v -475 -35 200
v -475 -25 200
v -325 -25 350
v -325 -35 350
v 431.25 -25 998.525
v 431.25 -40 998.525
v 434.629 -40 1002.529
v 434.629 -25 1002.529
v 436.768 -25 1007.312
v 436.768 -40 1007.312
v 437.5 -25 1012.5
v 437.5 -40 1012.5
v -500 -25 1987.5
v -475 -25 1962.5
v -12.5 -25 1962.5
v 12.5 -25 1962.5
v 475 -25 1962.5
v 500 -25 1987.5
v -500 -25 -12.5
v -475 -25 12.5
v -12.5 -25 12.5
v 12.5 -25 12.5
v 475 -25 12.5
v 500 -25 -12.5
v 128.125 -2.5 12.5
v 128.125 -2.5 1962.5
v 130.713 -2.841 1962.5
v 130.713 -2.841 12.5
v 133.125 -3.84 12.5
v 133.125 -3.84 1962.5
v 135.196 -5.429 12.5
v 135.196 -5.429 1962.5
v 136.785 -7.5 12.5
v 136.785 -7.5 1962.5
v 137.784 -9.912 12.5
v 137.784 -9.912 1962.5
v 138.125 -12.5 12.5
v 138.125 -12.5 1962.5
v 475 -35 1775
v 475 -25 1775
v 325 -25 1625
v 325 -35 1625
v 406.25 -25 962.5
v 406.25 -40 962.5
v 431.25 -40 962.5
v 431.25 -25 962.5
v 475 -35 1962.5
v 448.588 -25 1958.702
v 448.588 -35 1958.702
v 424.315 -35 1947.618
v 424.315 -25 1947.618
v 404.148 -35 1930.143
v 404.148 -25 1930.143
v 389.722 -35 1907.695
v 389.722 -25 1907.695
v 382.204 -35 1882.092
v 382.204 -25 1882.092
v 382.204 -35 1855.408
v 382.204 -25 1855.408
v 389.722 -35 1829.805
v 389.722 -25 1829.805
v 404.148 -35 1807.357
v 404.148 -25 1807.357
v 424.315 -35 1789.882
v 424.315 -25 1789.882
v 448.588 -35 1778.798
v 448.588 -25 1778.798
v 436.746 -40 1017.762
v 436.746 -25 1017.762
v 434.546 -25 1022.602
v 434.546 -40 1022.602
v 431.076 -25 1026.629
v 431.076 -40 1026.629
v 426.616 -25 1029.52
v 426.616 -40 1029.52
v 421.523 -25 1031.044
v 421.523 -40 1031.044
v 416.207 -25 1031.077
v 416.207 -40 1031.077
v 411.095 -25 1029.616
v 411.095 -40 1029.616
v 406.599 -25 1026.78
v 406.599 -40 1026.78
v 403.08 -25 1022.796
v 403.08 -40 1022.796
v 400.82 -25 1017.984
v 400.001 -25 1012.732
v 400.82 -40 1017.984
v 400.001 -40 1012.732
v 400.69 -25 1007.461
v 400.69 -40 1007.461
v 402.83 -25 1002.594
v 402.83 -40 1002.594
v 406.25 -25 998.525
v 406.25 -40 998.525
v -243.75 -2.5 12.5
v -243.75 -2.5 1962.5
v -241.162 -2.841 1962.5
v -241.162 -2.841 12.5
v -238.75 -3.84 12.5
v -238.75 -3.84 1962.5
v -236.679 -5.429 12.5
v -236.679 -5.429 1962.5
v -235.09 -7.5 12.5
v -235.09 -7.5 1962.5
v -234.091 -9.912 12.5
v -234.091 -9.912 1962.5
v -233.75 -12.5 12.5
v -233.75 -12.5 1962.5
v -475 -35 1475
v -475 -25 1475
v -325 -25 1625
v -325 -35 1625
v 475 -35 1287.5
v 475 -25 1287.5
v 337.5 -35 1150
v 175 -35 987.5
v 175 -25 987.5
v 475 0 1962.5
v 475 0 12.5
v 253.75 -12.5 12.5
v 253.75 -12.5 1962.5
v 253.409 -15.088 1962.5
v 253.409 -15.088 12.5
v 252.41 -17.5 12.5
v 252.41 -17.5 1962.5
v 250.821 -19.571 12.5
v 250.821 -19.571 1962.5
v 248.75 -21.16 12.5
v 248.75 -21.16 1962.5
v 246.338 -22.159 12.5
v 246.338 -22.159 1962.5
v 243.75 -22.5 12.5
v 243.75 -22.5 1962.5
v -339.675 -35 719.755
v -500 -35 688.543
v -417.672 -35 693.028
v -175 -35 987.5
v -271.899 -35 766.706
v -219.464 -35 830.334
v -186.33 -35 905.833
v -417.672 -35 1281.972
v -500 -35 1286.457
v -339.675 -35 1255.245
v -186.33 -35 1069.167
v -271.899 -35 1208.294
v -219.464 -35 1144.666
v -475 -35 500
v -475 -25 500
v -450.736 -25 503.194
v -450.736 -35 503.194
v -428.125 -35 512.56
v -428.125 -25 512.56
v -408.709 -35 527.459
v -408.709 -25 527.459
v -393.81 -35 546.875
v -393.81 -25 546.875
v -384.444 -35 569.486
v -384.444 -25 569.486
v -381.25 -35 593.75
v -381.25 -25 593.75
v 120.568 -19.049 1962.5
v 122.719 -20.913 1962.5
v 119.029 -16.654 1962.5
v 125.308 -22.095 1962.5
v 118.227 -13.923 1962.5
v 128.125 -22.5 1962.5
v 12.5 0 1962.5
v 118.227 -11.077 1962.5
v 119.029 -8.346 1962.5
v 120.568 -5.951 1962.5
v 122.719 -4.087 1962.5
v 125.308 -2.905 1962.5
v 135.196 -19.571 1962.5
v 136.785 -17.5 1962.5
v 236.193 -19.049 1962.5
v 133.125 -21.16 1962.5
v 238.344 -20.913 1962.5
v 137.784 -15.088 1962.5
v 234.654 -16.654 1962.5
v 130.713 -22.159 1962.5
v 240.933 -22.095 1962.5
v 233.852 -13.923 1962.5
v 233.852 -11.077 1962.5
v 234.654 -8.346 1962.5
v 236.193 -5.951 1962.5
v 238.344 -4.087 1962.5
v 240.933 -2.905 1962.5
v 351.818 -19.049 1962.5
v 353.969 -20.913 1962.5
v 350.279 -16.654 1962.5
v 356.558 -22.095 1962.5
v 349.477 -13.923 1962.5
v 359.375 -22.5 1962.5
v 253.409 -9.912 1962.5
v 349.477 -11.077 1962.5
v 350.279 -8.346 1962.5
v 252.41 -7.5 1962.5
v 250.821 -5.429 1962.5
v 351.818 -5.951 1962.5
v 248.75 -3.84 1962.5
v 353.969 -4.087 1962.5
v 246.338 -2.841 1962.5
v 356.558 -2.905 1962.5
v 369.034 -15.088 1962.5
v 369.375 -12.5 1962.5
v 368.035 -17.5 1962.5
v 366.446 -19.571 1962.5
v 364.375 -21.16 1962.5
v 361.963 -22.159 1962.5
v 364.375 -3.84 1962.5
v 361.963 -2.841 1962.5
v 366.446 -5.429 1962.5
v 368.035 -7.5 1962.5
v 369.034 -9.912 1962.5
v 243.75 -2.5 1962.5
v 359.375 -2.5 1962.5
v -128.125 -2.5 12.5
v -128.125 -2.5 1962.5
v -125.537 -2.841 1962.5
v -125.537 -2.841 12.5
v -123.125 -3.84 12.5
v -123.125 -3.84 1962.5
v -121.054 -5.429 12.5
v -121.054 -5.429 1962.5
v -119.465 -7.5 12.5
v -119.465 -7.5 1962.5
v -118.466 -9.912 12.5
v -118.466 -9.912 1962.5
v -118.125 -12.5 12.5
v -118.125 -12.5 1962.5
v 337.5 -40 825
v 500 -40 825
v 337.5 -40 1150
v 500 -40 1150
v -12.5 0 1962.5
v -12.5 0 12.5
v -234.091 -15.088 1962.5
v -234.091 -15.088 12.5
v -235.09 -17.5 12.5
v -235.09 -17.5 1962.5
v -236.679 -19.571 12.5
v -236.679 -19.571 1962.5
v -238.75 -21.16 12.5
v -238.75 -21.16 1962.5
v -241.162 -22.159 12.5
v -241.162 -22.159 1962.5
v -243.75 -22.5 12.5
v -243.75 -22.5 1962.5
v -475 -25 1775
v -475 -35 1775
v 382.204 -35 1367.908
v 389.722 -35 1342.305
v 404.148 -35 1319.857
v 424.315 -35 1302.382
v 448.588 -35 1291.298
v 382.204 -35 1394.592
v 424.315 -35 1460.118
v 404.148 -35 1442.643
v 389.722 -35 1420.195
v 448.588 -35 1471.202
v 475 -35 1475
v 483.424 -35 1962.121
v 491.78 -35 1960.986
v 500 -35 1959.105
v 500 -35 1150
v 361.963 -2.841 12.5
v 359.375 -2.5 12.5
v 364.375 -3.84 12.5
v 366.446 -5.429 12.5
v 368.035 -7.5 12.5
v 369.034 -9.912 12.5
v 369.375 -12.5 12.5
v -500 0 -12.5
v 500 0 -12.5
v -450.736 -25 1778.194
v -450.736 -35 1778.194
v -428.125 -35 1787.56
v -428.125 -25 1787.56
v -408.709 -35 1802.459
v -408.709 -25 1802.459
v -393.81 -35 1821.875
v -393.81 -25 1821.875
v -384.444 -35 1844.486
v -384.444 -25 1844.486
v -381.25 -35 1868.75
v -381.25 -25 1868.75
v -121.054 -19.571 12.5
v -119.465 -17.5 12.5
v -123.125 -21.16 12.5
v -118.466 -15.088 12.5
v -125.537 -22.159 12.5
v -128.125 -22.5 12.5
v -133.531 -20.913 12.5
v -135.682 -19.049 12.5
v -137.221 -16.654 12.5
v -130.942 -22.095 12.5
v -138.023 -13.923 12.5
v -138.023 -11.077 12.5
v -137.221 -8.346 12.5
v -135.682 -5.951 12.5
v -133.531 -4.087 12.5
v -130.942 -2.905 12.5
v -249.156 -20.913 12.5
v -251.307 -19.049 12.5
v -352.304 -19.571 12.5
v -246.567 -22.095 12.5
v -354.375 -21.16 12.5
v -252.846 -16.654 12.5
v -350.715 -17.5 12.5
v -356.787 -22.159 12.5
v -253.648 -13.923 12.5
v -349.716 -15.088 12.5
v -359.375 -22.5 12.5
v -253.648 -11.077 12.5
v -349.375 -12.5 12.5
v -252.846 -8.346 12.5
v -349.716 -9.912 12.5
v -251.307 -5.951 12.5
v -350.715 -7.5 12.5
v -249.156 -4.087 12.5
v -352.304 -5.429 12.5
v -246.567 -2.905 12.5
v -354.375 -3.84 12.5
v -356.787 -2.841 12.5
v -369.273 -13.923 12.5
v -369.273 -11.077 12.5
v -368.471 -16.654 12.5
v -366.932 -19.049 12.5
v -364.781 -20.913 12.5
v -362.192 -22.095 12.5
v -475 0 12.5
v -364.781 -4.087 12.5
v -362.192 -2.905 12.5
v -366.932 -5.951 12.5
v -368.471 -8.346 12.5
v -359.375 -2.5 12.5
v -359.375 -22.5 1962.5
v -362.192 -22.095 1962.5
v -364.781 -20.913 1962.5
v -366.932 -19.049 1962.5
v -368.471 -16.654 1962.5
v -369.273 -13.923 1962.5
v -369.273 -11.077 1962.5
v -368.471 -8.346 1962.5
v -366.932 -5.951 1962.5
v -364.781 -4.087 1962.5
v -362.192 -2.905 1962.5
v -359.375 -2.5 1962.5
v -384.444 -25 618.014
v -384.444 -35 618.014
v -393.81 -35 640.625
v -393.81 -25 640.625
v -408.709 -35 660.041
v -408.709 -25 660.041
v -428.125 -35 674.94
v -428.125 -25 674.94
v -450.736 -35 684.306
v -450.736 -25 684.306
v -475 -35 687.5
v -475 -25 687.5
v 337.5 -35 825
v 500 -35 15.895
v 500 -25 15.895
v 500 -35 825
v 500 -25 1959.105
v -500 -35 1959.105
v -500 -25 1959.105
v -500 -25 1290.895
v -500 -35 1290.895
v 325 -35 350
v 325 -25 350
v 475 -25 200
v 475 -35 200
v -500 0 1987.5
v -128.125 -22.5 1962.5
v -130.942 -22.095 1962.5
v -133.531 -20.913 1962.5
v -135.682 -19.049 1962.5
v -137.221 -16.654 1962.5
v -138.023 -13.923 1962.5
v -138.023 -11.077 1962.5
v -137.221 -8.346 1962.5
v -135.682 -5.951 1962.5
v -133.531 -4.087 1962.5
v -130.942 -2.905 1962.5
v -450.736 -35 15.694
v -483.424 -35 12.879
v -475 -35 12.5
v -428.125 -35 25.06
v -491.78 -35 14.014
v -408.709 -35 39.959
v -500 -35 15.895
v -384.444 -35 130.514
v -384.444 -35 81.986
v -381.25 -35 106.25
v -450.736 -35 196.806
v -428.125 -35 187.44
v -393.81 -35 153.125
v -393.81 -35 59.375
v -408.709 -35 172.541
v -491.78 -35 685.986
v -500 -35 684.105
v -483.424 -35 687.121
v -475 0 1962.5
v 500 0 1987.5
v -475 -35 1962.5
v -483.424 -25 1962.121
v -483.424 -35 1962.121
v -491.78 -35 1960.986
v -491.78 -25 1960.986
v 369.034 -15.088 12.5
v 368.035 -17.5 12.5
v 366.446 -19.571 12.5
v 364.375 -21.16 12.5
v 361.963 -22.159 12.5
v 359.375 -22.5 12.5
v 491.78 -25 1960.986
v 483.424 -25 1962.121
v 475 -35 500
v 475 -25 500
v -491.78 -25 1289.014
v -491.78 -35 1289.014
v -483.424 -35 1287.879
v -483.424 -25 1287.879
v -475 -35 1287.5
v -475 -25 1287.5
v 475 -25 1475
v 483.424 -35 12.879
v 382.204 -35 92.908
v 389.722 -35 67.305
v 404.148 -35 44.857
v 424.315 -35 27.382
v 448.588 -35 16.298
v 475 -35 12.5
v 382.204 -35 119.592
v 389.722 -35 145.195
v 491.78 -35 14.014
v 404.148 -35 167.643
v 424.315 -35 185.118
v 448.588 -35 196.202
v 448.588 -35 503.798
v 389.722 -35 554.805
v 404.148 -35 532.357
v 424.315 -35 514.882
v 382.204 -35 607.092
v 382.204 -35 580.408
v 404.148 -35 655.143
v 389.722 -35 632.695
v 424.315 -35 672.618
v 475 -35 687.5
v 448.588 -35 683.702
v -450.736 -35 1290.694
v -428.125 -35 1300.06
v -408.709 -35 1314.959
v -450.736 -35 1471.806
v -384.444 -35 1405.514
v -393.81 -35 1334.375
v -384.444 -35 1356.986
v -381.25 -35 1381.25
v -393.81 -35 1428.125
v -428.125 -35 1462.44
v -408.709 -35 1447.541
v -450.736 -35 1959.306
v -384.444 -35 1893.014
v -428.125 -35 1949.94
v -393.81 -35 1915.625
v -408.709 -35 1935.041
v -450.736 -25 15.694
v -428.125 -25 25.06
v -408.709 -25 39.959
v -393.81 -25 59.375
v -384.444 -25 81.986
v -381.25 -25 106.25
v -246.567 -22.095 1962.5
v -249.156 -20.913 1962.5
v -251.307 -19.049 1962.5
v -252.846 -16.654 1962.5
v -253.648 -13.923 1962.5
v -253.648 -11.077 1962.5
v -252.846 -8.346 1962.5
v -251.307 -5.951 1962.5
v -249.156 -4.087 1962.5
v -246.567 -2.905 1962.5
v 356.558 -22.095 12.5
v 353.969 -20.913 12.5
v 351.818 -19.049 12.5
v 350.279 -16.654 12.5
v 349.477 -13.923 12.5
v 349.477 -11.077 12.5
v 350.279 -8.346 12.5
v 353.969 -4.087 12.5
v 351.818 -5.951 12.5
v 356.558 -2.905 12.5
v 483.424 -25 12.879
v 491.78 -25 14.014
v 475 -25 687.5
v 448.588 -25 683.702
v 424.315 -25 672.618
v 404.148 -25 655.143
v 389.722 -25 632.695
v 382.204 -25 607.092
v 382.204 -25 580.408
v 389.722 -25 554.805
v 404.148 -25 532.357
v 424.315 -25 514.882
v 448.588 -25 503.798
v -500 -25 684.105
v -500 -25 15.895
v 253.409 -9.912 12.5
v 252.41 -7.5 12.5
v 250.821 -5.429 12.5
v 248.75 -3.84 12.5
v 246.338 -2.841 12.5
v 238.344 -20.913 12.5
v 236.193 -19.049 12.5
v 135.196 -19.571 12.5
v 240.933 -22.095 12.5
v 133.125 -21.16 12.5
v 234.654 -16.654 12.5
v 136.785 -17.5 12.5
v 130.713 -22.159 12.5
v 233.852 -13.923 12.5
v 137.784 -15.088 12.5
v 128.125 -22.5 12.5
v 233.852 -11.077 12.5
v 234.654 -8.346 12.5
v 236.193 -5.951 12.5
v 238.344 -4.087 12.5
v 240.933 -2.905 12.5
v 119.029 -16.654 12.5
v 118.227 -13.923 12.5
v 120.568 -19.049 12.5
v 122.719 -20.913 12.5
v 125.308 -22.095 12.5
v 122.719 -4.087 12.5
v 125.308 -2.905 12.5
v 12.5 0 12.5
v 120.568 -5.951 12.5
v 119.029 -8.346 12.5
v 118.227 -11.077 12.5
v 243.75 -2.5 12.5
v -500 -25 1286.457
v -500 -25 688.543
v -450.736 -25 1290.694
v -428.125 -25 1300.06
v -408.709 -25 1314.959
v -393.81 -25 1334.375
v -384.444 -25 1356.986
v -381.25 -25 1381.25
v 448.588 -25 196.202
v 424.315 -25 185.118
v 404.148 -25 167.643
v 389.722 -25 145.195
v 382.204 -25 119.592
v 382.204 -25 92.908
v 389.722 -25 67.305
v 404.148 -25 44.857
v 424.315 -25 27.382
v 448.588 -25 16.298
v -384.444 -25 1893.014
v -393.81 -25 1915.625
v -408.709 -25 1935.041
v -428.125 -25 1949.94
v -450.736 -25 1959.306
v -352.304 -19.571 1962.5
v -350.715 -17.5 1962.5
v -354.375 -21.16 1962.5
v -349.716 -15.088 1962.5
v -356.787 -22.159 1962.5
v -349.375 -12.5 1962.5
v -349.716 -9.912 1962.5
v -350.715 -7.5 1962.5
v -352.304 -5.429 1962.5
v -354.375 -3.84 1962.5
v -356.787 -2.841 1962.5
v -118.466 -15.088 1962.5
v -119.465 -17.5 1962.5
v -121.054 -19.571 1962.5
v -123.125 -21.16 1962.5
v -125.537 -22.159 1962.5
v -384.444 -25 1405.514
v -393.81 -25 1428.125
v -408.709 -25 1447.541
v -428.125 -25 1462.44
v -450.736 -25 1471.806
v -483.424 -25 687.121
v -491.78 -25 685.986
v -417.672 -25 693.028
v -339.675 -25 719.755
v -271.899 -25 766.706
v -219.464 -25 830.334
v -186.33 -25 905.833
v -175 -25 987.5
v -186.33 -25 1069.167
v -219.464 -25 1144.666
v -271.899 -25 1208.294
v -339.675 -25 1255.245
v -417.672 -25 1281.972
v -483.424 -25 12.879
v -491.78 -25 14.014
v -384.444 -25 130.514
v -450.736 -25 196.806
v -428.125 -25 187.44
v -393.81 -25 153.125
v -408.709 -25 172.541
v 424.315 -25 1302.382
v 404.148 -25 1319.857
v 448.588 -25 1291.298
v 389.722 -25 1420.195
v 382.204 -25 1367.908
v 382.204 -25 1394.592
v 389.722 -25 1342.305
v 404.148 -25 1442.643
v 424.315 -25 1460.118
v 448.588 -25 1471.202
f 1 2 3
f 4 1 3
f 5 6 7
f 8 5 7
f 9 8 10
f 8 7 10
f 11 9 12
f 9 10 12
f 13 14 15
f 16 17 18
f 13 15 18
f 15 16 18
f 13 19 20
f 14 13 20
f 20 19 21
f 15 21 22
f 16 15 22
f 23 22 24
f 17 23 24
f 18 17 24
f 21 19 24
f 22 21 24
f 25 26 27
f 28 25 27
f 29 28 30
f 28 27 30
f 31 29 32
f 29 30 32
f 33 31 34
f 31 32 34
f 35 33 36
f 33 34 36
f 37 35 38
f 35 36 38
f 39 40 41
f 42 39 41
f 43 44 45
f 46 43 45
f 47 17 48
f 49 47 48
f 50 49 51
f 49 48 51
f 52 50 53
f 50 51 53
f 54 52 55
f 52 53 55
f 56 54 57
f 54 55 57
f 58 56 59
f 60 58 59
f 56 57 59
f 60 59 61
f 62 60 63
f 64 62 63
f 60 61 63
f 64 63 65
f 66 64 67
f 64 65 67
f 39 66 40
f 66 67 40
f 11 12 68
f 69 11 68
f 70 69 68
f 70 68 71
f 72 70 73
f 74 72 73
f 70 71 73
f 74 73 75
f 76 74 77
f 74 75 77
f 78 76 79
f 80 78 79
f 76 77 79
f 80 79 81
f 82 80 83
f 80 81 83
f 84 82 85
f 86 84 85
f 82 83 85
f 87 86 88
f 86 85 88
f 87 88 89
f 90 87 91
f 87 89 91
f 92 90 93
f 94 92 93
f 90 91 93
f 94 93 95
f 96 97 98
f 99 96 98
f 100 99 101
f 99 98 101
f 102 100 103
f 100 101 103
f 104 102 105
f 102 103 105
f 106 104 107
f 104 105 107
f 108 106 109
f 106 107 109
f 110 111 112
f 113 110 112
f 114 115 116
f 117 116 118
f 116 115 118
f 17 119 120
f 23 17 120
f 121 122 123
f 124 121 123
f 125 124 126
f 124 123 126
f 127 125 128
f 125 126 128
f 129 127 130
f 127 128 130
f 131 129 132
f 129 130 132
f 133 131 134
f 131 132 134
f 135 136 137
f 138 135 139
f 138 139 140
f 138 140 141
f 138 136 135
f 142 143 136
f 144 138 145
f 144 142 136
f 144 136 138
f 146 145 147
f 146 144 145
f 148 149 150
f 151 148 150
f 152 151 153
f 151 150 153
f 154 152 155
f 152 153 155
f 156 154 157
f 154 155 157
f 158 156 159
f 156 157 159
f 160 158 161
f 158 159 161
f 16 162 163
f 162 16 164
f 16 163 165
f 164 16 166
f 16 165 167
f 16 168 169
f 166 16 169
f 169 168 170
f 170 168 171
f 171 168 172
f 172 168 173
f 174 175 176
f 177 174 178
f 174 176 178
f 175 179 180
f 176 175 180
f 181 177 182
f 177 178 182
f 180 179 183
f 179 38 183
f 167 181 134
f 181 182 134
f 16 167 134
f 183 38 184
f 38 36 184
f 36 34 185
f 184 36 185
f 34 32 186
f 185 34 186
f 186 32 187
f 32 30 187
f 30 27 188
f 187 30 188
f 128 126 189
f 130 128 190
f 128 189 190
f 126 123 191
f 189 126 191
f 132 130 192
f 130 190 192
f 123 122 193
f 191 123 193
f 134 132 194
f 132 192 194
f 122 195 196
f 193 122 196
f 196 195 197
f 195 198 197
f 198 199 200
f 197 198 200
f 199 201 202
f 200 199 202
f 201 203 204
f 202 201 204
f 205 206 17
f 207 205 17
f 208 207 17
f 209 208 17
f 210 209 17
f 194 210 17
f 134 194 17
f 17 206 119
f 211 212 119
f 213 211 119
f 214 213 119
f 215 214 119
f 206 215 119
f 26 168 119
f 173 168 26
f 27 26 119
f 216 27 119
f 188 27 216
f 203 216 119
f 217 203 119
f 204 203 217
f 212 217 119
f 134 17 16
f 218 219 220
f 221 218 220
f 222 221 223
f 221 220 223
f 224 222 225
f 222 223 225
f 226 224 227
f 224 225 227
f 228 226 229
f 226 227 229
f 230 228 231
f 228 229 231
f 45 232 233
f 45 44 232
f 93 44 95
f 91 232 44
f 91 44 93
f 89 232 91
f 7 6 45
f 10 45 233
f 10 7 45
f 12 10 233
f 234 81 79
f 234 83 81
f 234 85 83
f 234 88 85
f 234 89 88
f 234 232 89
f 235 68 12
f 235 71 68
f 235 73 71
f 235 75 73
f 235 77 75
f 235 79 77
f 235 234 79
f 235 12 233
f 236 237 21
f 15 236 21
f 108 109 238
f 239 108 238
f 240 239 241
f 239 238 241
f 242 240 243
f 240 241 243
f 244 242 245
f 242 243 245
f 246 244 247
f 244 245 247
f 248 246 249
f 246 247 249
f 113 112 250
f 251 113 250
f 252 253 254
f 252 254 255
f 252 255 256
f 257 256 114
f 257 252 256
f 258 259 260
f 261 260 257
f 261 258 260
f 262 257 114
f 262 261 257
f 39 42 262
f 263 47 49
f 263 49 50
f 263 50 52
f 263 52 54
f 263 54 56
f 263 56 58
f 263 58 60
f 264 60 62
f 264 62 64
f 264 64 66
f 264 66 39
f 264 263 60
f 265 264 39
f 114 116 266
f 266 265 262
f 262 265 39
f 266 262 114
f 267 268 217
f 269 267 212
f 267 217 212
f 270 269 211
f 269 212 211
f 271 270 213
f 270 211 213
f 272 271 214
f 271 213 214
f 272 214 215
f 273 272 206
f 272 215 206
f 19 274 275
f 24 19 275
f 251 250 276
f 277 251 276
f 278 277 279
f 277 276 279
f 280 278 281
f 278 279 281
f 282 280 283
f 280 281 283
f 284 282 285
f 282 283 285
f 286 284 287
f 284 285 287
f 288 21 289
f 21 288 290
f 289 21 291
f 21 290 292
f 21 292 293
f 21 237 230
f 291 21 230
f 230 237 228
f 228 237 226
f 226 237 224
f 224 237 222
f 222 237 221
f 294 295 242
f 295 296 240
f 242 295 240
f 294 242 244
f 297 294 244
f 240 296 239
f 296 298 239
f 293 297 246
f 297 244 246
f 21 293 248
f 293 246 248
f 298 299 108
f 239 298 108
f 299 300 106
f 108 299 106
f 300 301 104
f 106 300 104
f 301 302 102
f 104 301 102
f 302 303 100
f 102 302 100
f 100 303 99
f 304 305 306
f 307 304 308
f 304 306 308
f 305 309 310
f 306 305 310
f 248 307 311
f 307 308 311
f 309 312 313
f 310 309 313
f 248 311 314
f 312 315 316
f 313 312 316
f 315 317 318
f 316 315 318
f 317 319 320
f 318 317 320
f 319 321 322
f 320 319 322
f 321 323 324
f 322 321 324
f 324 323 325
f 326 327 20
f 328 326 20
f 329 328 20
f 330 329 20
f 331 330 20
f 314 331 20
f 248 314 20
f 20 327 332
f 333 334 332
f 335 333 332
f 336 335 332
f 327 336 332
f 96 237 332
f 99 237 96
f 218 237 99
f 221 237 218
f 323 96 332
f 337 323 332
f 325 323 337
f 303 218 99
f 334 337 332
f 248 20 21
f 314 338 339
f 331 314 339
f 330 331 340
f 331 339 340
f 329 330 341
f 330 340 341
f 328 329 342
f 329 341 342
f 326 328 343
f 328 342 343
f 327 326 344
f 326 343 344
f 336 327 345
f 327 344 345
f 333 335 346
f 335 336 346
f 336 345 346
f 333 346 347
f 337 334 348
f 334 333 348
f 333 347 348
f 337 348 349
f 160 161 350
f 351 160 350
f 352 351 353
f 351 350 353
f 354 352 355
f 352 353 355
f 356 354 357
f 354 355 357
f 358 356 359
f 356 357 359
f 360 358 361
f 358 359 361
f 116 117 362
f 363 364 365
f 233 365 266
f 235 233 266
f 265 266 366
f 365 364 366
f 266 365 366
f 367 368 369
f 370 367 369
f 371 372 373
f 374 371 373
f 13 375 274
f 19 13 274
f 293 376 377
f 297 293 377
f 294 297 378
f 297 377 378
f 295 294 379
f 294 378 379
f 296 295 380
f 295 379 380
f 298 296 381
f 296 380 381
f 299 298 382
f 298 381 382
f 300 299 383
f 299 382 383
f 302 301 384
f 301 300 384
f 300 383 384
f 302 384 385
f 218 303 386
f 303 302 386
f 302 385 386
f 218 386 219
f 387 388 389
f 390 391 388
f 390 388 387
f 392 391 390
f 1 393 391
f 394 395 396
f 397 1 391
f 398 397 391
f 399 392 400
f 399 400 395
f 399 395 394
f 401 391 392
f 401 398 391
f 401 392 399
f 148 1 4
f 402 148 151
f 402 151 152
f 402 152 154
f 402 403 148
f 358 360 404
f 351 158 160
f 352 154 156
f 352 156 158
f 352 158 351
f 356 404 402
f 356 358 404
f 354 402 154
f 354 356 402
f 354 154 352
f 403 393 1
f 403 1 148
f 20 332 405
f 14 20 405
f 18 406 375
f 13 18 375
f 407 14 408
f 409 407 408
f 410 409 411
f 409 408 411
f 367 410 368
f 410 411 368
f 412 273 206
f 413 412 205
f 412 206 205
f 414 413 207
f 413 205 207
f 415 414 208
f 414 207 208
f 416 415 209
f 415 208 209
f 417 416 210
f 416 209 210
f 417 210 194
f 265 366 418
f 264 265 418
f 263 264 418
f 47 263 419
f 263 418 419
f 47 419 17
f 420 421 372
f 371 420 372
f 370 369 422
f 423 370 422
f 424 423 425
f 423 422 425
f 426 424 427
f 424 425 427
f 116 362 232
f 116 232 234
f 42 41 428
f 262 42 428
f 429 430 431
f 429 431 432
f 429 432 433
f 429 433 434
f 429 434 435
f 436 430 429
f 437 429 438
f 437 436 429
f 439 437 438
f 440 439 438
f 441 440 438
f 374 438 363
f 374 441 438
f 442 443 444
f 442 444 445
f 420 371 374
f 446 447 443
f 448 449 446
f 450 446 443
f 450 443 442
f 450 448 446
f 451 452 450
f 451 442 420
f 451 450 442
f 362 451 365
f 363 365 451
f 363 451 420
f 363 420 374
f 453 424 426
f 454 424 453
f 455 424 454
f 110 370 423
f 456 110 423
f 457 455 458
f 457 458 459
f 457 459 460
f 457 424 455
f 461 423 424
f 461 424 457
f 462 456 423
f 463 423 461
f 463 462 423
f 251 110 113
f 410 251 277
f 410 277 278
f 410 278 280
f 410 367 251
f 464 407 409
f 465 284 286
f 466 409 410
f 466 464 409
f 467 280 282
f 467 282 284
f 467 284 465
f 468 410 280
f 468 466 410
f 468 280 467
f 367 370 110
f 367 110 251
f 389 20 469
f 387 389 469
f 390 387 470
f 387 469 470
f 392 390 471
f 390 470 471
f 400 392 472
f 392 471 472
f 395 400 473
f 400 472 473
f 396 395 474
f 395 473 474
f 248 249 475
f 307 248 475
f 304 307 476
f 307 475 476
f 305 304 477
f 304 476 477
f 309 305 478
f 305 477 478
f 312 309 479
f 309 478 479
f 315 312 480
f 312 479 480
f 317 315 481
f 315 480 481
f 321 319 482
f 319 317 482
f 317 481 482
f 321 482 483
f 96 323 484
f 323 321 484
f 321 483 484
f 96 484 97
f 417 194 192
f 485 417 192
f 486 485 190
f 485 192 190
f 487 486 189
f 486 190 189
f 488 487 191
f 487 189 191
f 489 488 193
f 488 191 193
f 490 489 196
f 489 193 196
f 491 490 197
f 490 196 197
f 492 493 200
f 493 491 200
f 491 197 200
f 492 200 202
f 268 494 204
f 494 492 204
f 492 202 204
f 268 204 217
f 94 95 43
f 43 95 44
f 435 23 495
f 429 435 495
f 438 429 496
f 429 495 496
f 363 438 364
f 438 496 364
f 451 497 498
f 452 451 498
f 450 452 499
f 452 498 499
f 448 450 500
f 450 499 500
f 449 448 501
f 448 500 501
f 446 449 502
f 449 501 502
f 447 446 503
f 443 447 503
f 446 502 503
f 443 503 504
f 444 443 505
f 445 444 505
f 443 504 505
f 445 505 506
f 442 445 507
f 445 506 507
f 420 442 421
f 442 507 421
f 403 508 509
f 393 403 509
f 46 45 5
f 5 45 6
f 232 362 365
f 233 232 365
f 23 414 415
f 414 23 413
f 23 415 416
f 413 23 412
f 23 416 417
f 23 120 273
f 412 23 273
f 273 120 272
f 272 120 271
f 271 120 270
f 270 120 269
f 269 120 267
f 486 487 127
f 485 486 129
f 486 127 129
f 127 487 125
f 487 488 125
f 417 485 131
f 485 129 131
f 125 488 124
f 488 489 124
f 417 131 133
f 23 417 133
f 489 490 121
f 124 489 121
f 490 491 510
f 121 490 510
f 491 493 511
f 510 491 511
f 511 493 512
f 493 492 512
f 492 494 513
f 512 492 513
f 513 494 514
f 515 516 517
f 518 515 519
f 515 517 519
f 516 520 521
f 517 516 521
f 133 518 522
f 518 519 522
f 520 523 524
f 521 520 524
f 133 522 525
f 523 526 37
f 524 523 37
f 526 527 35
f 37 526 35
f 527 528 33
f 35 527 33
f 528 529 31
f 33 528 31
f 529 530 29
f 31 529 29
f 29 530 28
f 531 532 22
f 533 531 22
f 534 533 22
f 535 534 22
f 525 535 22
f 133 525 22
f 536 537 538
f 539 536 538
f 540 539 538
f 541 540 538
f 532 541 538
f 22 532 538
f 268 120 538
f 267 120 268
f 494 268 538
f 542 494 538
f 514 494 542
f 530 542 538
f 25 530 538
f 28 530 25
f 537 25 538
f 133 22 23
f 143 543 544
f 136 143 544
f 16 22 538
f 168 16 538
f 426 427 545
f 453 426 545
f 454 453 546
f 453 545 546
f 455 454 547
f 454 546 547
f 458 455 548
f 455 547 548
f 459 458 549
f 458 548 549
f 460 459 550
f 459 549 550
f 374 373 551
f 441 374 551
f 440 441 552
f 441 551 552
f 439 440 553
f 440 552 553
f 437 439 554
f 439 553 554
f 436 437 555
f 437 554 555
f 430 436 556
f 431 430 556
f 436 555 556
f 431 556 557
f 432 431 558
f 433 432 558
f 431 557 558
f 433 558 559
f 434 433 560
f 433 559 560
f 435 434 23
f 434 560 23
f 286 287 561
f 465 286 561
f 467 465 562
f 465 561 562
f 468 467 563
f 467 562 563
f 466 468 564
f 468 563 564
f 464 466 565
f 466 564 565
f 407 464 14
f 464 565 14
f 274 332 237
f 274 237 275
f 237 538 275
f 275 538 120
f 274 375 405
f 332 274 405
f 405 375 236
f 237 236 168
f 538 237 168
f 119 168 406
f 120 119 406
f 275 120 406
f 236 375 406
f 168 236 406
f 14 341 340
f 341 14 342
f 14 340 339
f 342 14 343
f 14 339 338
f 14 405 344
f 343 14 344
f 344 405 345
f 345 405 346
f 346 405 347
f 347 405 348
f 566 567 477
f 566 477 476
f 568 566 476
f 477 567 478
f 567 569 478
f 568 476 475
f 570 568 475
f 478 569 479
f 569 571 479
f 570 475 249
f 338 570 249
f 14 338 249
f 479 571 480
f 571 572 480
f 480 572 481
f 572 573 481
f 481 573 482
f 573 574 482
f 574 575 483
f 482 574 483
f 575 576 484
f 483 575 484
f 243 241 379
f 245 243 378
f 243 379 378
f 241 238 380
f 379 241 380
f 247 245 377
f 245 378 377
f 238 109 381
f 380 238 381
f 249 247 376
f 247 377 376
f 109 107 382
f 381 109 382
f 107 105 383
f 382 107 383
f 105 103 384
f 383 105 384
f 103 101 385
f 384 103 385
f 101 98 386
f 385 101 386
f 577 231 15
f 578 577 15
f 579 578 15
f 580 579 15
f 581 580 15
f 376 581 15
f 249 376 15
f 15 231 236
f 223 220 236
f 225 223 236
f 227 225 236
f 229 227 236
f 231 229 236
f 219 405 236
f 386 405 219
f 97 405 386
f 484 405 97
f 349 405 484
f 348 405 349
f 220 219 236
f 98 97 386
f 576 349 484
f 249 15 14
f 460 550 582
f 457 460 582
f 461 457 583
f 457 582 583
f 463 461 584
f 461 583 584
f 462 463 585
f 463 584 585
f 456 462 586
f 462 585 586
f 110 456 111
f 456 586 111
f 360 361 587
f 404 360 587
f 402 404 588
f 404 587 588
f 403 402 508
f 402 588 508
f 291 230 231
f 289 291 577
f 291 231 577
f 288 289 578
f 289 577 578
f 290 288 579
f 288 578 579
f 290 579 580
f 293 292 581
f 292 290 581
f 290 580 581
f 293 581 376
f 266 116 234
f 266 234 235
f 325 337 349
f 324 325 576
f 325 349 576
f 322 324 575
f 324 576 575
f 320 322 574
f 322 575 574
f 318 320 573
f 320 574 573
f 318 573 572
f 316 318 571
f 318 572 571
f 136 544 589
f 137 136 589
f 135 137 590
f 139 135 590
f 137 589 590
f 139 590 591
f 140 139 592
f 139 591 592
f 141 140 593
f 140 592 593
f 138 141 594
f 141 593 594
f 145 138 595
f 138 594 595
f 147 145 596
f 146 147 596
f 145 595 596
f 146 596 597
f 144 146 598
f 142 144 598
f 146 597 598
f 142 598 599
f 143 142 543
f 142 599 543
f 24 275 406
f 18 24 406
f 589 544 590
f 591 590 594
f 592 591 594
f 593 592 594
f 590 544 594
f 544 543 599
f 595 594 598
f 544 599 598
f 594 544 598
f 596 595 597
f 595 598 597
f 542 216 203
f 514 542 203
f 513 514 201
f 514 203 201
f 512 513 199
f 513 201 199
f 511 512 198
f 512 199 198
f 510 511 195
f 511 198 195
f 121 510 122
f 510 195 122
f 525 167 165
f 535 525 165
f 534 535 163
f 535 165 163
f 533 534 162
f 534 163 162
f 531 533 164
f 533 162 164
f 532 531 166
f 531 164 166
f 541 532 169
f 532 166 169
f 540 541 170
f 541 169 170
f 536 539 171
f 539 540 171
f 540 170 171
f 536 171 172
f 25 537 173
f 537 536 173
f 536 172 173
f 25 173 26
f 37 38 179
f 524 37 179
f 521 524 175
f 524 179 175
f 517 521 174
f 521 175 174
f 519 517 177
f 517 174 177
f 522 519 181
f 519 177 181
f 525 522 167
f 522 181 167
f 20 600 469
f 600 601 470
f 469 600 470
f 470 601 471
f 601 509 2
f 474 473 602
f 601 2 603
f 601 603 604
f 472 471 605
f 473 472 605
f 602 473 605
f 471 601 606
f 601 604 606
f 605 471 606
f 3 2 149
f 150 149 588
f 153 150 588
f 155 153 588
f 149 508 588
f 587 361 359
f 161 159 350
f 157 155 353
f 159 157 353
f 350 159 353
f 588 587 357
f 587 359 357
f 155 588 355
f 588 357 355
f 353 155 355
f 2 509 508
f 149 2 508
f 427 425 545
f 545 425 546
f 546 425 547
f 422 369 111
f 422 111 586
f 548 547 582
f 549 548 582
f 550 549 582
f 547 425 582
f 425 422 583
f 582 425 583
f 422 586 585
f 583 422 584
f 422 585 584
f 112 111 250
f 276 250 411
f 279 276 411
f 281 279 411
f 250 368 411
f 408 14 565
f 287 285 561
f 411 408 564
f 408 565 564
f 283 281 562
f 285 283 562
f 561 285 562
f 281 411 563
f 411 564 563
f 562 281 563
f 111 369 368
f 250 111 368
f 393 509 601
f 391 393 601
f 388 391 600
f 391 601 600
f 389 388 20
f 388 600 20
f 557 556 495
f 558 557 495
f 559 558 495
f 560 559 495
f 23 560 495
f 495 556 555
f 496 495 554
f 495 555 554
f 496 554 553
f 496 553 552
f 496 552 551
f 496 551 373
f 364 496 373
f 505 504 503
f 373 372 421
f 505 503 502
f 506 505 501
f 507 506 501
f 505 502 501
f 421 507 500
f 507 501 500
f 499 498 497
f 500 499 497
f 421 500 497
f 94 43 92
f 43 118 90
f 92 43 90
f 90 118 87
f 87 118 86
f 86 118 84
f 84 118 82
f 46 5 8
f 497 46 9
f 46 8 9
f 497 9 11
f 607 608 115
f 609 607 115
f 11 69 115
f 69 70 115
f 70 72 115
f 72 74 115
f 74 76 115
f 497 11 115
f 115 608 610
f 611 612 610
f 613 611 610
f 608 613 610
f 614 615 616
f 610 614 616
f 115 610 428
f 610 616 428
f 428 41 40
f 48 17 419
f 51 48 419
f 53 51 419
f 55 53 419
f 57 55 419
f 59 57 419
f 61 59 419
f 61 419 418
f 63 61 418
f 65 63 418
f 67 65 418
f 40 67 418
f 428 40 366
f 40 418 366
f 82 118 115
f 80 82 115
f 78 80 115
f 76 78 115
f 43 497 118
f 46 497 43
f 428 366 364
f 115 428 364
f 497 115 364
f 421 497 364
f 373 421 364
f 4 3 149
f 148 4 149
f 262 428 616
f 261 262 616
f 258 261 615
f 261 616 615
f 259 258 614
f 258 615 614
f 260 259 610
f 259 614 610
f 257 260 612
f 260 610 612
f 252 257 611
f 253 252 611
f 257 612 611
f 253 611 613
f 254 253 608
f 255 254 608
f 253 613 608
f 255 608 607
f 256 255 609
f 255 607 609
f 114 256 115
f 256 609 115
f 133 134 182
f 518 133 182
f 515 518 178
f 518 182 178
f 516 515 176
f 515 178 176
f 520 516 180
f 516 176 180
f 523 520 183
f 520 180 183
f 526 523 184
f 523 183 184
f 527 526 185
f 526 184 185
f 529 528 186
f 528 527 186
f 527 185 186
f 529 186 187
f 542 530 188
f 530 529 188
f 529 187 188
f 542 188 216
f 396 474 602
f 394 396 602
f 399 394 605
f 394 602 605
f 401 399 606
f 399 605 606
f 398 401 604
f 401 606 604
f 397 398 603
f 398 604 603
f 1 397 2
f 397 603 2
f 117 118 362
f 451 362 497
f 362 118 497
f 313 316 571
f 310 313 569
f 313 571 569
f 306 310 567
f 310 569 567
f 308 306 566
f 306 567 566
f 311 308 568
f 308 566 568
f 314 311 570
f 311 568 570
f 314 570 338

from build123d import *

# Parameters (mm, degrees)
F0_W      = 25
F0_H      = 25
F0_H_2    = 1950
F0_W_2    = 950
F1_DEPTH  = 25
F3_DEPTH  = 1975
F5_DEPTH  = 10
F7_DEPTH  = 1975
F9_DEPTH  = 1975
F10_W     = 162.5
F10_H     = 325
F11_DEPTH = 5
F13_DEPTH = 86.3


# Not quite as in the source:
# - ends of sketch curves that miss each other by under 0.0002 mm in the source are joined


with BuildPart() as f1:
    # F0 (on Front) → F1 (new body)
    with BuildSketch(Plane.XZ):
        with Locations((487.5, 0)):
            Rectangle(F0_W, F0_H)
        with Locations((487.5, 987.5)):
            Rectangle(F0_W, F0_H_2)
        Rectangle(F0_W_2, F0_H)
        with Locations((487.5, 1975)):
            Rectangle(F0_W, F0_H)
        with Locations((-487.5, 0)):
            Rectangle(F0_W, F0_H)
        with Locations((-487.5, 987.5)):
            Rectangle(F0_W, F0_H_2)
        with Locations((0, 1975)):
            Rectangle(F0_W_2, F0_H)
        with Locations((-487.5, 1975)):
            Rectangle(F0_W, F0_H)
    extrude(amount=F1_DEPTH)

    # F2 (on Top) → F3 (join)
    with BuildSketch(Plane.XY):
        Polygon((12.5, 0), (0, 0), (-12.5, 0), (-12.5, -25), (0, -25), (12.5, -25), align=None)
    extrude(amount=F3_DEPTH)

    # F6 (on face) → F7 (join)
    with BuildSketch(Plane(origin=(0, 0, 1962.5), x_dir=(1, 0, 0), z_dir=(0, 0, -1))):
        with BuildLine():
            Line((-128.125, 2.5), (-128.125, 22.5))
            ThreePointArc((-128.125, 22.5), (-138.125, 12.5), (-128.125, 2.5))
        make_face()
        with BuildLine():
            ThreePointArc((-118.125, 12.5), (-121.0539321881, 19.5710678119), (-128.125, 22.5))
            Line((-128.125, 22.5), (-128.125, 2.5))
            ThreePointArc((-128.125, 2.5), (-121.0539321881, 5.4289321881), (-118.125, 12.5))
        make_face()
        with BuildLine():
            Line((-359.375, 2.5), (-359.375, 22.5))
            ThreePointArc((-359.375, 22.5), (-369.375, 12.5), (-359.375, 2.5))
        make_face()
        with BuildLine():
            ThreePointArc((-349.375, 12.5), (-352.3039321881, 19.5710678119), (-359.375, 22.5))
            Line((-359.375, 22.5), (-359.375, 2.5))
            ThreePointArc((-359.375, 2.5), (-352.3039321881, 5.4289321881), (-349.375, 12.5))
        make_face()
        with BuildLine():
            ThreePointArc((-233.75, 12.5), (-236.6789321881, 19.5710678119), (-243.75, 22.5))
            Line((-243.75, 22.5), (-243.75, 2.5))
            ThreePointArc((-243.75, 2.5), (-236.6789321881, 5.4289321881), (-233.75, 12.5))
        make_face()
        with BuildLine():
            Line((-243.75, 2.5), (-243.75, 22.5))
            ThreePointArc((-243.75, 22.5), (-253.75, 12.5), (-243.75, 2.5))
        make_face()
    extrude(amount=F7_DEPTH)

    # F8 (on face) → F9 (join)
    with BuildSketch(Plane(origin=(0, 0, 1962.5), x_dir=(1, 0, 0), z_dir=(0, 0, -1))):
        with BuildLine():
            Line((128.125, 2.5), (128.125, 22.5))
            ThreePointArc((128.125, 22.5), (118.125, 12.5), (128.125, 2.5))
        make_face()
        with BuildLine():
            ThreePointArc((138.125, 12.5), (135.1960678119, 19.5710678119), (128.125, 22.5))
            Line((128.125, 22.5), (128.125, 2.5))
            ThreePointArc((128.125, 2.5), (135.1960678119, 5.4289321881), (138.125, 12.5))
        make_face()
        with BuildLine():
            Line((359.375, 2.5), (359.375, 22.5))
            ThreePointArc((359.375, 22.5), (349.375, 12.5), (359.375, 2.5))
        make_face()
        with BuildLine():
            ThreePointArc((369.375, 12.5), (366.4460678119, 19.5710678119), (359.375, 22.5))
            Line((359.375, 22.5), (359.375, 2.5))
            ThreePointArc((359.375, 2.5), (366.4460678119, 5.4289321881), (369.375, 12.5))
        make_face()
        with BuildLine():
            Line((243.75, 2.5), (243.75, 22.5))
            ThreePointArc((243.75, 22.5), (233.75, 12.5), (243.75, 2.5))
        make_face()
        with BuildLine():
            ThreePointArc((253.75, 12.5), (250.8210678119, 19.5710678119), (243.75, 22.5))
            Line((243.75, 22.5), (243.75, 2.5))
            ThreePointArc((243.75, 2.5), (250.8210678119, 5.4289321881), (253.75, 12.5))
        make_face()
    extrude(amount=F9_DEPTH)


with BuildPart() as f5:
    # F4 (on face) → F5 (new body)
    with BuildSketch(Plane.XZ.offset(25)):
        with BuildLine():
            ThreePointArc((500, 684.1052018425), (487.6147201171, 686.6474237337), (475, 687.5))
            Line((475, 687.5), (500, 662.5))
            Line((500, 662.5), (500, 684.1052018425))
        make_face()
        with BuildLine():
            Line((475, 500), (475, 687.5))
            ThreePointArc((475, 687.5), (381.25, 593.75), (475, 500))
        make_face()
        with BuildLine():
            Line((475, 1287.5), (475, 687.5))
            ThreePointArc((475, 687.5), (487.6147201171, 686.6474237337), (500, 684.1052018425))
            Line((500, 684.1052018425), (500, 1290.8947981575))
            ThreePointArc((500, 1290.8947981575), (487.6147201171, 1288.3525762663), (475, 1287.5))
        make_face()
        Polygon((175, 987.5), (475, 687.5), (475, 1287.5), align=None)
        Polygon((500, 662.5), (475, 687.5), (475, 500), (500, 525), align=None)
        with BuildLine():
            ThreePointArc((500, 503.3947981575), (487.6147201171, 500.8525762663), (475, 500))
            Line((475, 500), (475, 350))
            Line((475, 350), (475, 200))
            ThreePointArc((475, 200), (487.6147201171, 199.1474237337), (500, 196.6052018425))
            Line((500, 196.6052018425), (500, 503.3947981575))
        make_face()
        Polygon((475, 350), (475, 500), (325, 350), align=None)
        with BuildLine():
            Line((500, 525), (475, 500))
            ThreePointArc((475, 500), (487.6147201171, 500.8525762663), (500, 503.3947981575))
            Line((500, 503.3947981575), (500, 525))
        make_face()
        Polygon((475, 1475), (475, 1287.5), (500, 1312.5), (500, 1450), align=None)
        with BuildLine():
            Line((500, 1312.5), (475, 1287.5))
            ThreePointArc((475, 1287.5), (487.6147201171, 1288.3525762663), (500, 1290.8947981575))
            Line((500, 1290.8947981575), (500, 1312.5))
        make_face()
        with BuildLine():
            ThreePointArc((475, 1475), (381.25, 1381.25), (475, 1287.5))
            Line((475, 1287.5), (475, 1475))
        make_face()
        Polygon((475, 200), (475, 350), (325, 350), align=None)
        Polygon((325, 1625), (475, 1475), (475, 1625), align=None)
        with BuildLine():
            ThreePointArc((500, 1471.6052018425), (487.6147201171, 1474.1474237337), (475, 1475))
            Line((475, 1475), (500, 1450))
            Line((500, 1450), (500, 1471.6052018425))
        make_face()
        with BuildLine():
            Line((475, 1625), (475, 1475))
            ThreePointArc((475, 1475), (487.6147201171, 1474.1474237337), (500, 1471.6052018425))
            Line((500, 1471.6052018425), (500, 1778.3947981575))
            ThreePointArc((500, 1778.3947981575), (487.6147201171, 1775.8525762663), (475, 1775))
            Line((475, 1775), (475, 1625))
        make_face()
        with BuildLine():
            ThreePointArc((500, 196.6052018425), (487.6147201171, 199.1474237337), (475, 200))
            Line((475, 200), (500, 175))
            Line((500, 175), (500, 196.6052018425))
        make_face()
        with BuildLine():
            Line((475, 12.5), (475, 200))
            ThreePointArc((475, 200), (381.25, 106.25), (475, 12.5))
        make_face()
        with BuildLine():
            Line((500, 175), (475, 200))
            Line((475, 200), (475, 12.5))
            ThreePointArc((475, 12.5), (487.6147201171, 13.3525762663), (500, 15.8947981575))
            Line((500, 15.8947981575), (500, 175))
        make_face()
        Polygon((325, 1625), (475, 1625), (475, 1775), align=None)
        with BuildLine():
            Line((475, 1962.5), (475, 1775))
            Line((475, 1775), (500, 1800))
            Line((500, 1800), (500, 1959.1052018425))
            ThreePointArc((500, 1959.1052018425), (487.6147201171, 1961.6474237337), (475, 1962.5))
        make_face()
        with BuildLine():
            Line((500, 1800), (475, 1775))
            ThreePointArc((475, 1775), (487.6147201171, 1775.8525762663), (500, 1778.3947981575))
            Line((500, 1778.3947981575), (500, 1800))
        make_face()
        with BuildLine():
            ThreePointArc((475, 1962.5), (381.25, 1868.75), (475, 1775))
            Line((475, 1775), (475, 1962.5))
        make_face()
    extrude(amount=F5_DEPTH)

    # F10 (on face) → F11 (join)
    with BuildSketch(Plane.XZ.offset(35)):
        with Locations((418.75, 987.5)):
            Rectangle(F10_W, F10_H)
    extrude(amount=F11_DEPTH)

    # F12 (on face) → F13 (cut)
    with BuildSketch(Plane.XZ.offset(40)):
        with BuildLine():
            Line((406.25, 962.5), (431.25, 962.5))
            Line((431.25, 962.5), (431.25, 998.5245751406))
            ThreePointArc((431.25, 998.5245751406), (418.75, 993.75), (406.25, 998.5245751406))
            Line((406.25, 998.5245751406), (406.25, 962.5))
        make_face()
        with BuildLine():
            ThreePointArc((406.25, 998.5245751406), (418.75, 993.75), (431.25, 998.5245751406))
            ThreePointArc((431.25, 998.5245751406), (435.866329922, 1004.8453445538), (437.5, 1012.5))
            ThreePointArc((437.5, 1012.5), (411.0953445538, 1029.616329922), (406.25, 998.5245751406))
        make_face()
    extrude(amount=-F13_DEPTH, mode=Mode.SUBTRACT)


with BuildPart() as f5b:
    # F4 (on face) → F5, piece 2 (new body)
    with BuildSketch(Plane.XZ.offset(25)):
        with BuildLine():
            Line((-500, 175), (-500, 15.8947981575))
            ThreePointArc((-500, 15.8947981575), (-487.6147201171, 13.3525762663), (-475, 12.5))
            Line((-475, 12.5), (-475, 200))
            Line((-475, 200), (-500, 175))
        make_face()
        with BuildLine():
            Line((-500, 503.3947981575), (-500, 196.6052018425))
            ThreePointArc((-500, 196.6052018425), (-487.6147201171, 199.1474237337), (-475, 200))
            Line((-475, 200), (-475, 350))
            Line((-475, 350), (-475, 500))
            ThreePointArc((-475, 500), (-487.6147201171, 500.8525762663), (-500, 503.3947981575))
        make_face()
        with BuildLine():
            ThreePointArc((-475, 200), (-487.6147201171, 199.1474237337), (-500, 196.6052018425))
            Line((-500, 196.6052018425), (-500, 175))
            Line((-500, 175), (-475, 200))
        make_face()
        with BuildLine():
            Line((-475, 200), (-475, 12.5))
            ThreePointArc((-475, 12.5), (-408.7087392638, 39.9587392638), (-381.25, 106.25))
            ThreePointArc((-381.25, 106.25), (-408.7087392638, 172.5412607362), (-475, 200))
        make_face()
        Polygon((-475, 350), (-475, 200), (-325, 350), align=None)
        with BuildLine():
            Line((-500, 525), (-500, 503.3947981575))
            ThreePointArc((-500, 503.3947981575), (-487.6147201171, 500.8525762663), (-475, 500))
            Line((-475, 500), (-500, 525))
        make_face()
        Polygon((-475, 500), (-475, 350), (-325, 350), align=None)
        with BuildLine():
            ThreePointArc((-475, 687.5), (-487.6147201171, 686.6474237337), (-500, 684.1052018425))
            Line((-500, 684.1052018425), (-500, 525))
            Line((-500, 525), (-475, 500))
            Line((-475, 500), (-475, 687.5))
        make_face()
        with BuildLine():
            Line((-475, 687.5), (-475, 500))
            ThreePointArc((-475, 500), (-408.7087392638, 527.4587392638), (-381.25, 593.75))
            ThreePointArc((-381.25, 593.75), (-408.7087392638, 660.0412607362), (-475, 687.5))
        make_face()
    extrude(amount=F5_DEPTH)


with BuildPart() as f5c:
    # F4 (on face) → F5, piece 3 (new body)
    with BuildSketch(Plane.XZ.offset(25)):
        with BuildLine():
            ThreePointArc((-475, 1962.5), (-487.6147201171, 1961.6474237337), (-500, 1959.1052018425))
            Line((-500, 1959.1052018425), (-500, 1800))
            Line((-500, 1800), (-475, 1775))
            Line((-475, 1775), (-475, 1962.5))
        make_face()
        with BuildLine():
            ThreePointArc((-381.25, 1868.75), (-408.7087392638, 1935.0412607362), (-475, 1962.5))
            Line((-475, 1962.5), (-475, 1775))
            ThreePointArc((-475, 1775), (-408.7087392638, 1802.4587392638), (-381.25, 1868.75))
        make_face()
        with BuildLine():
            Line((-500, 1800), (-500, 1778.3947981575))
            ThreePointArc((-500, 1778.3947981575), (-487.6147201171, 1775.8525762663), (-475, 1775))
            Line((-475, 1775), (-500, 1800))
        make_face()
        with BuildLine():
            ThreePointArc((-475, 1775), (-487.6147201171, 1775.8525762663), (-500, 1778.3947981575))
            Line((-500, 1778.3947981575), (-500, 1471.6052018425))
            ThreePointArc((-500, 1471.6052018425), (-487.6147201171, 1474.1474237337), (-475, 1475))
            Line((-475, 1475), (-475, 1625))
            Line((-475, 1625), (-475, 1775))
        make_face()
        Polygon((-325, 1625), (-475, 1775), (-475, 1625), align=None)
        with BuildLine():
            ThreePointArc((-475, 1475), (-487.6147201171, 1474.1474237337), (-500, 1471.6052018425))
            Line((-500, 1471.6052018425), (-500, 1450))
            Line((-500, 1450), (-475, 1475))
        make_face()
        Polygon((-325, 1625), (-475, 1625), (-475, 1475), align=None)
        with BuildLine():
            Line((-475, 1287.5), (-475, 1475))
            Line((-475, 1475), (-500, 1450))
            Line((-500, 1450), (-500, 1290.8947981575))
            ThreePointArc((-500, 1290.8947981575), (-487.6147202668, 1288.3525762866), (-475, 1287.5))
        make_face()
        with BuildLine():
            ThreePointArc((-381.25, 1381.25), (-408.7087392638, 1447.5412607362), (-475, 1475))
            Line((-475, 1475), (-475, 1287.5))
            ThreePointArc((-475, 1287.5), (-408.7087393706, 1314.9587391569), (-381.25, 1381.25))
        make_face()
    extrude(amount=F5_DEPTH)


with BuildPart() as f5d:
    # F4 (on face) → F5, piece 4 (new body)
    with BuildSketch(Plane.XZ.offset(25)):
        with BuildLine():
            Line((-475, 1287.5), (-475, 687.5))
            ThreePointArc((-475, 687.5), (-262.867965644, 775.367965644), (-175, 987.5))
            ThreePointArc((-175, 987.5), (-262.8679657509, 1199.6320344628), (-475, 1287.5))
        make_face()
        with BuildLine():
            ThreePointArc((-500, 688.5434814225), (-487.5108837965, 687.7609838766), (-475, 687.5))
            Line((-475, 687.5), (-475, 1287.5))
            ThreePointArc((-475, 1287.5), (-487.5108839475, 1287.2390161171), (-500, 1286.4565185775))
            Line((-500, 1286.4565185775), (-500, 688.5434814225))
        make_face()
    extrude(amount=F5_DEPTH)


solid = Compound([f1.part, f5.part, f5b.part, f5c.part, f5d.part])
